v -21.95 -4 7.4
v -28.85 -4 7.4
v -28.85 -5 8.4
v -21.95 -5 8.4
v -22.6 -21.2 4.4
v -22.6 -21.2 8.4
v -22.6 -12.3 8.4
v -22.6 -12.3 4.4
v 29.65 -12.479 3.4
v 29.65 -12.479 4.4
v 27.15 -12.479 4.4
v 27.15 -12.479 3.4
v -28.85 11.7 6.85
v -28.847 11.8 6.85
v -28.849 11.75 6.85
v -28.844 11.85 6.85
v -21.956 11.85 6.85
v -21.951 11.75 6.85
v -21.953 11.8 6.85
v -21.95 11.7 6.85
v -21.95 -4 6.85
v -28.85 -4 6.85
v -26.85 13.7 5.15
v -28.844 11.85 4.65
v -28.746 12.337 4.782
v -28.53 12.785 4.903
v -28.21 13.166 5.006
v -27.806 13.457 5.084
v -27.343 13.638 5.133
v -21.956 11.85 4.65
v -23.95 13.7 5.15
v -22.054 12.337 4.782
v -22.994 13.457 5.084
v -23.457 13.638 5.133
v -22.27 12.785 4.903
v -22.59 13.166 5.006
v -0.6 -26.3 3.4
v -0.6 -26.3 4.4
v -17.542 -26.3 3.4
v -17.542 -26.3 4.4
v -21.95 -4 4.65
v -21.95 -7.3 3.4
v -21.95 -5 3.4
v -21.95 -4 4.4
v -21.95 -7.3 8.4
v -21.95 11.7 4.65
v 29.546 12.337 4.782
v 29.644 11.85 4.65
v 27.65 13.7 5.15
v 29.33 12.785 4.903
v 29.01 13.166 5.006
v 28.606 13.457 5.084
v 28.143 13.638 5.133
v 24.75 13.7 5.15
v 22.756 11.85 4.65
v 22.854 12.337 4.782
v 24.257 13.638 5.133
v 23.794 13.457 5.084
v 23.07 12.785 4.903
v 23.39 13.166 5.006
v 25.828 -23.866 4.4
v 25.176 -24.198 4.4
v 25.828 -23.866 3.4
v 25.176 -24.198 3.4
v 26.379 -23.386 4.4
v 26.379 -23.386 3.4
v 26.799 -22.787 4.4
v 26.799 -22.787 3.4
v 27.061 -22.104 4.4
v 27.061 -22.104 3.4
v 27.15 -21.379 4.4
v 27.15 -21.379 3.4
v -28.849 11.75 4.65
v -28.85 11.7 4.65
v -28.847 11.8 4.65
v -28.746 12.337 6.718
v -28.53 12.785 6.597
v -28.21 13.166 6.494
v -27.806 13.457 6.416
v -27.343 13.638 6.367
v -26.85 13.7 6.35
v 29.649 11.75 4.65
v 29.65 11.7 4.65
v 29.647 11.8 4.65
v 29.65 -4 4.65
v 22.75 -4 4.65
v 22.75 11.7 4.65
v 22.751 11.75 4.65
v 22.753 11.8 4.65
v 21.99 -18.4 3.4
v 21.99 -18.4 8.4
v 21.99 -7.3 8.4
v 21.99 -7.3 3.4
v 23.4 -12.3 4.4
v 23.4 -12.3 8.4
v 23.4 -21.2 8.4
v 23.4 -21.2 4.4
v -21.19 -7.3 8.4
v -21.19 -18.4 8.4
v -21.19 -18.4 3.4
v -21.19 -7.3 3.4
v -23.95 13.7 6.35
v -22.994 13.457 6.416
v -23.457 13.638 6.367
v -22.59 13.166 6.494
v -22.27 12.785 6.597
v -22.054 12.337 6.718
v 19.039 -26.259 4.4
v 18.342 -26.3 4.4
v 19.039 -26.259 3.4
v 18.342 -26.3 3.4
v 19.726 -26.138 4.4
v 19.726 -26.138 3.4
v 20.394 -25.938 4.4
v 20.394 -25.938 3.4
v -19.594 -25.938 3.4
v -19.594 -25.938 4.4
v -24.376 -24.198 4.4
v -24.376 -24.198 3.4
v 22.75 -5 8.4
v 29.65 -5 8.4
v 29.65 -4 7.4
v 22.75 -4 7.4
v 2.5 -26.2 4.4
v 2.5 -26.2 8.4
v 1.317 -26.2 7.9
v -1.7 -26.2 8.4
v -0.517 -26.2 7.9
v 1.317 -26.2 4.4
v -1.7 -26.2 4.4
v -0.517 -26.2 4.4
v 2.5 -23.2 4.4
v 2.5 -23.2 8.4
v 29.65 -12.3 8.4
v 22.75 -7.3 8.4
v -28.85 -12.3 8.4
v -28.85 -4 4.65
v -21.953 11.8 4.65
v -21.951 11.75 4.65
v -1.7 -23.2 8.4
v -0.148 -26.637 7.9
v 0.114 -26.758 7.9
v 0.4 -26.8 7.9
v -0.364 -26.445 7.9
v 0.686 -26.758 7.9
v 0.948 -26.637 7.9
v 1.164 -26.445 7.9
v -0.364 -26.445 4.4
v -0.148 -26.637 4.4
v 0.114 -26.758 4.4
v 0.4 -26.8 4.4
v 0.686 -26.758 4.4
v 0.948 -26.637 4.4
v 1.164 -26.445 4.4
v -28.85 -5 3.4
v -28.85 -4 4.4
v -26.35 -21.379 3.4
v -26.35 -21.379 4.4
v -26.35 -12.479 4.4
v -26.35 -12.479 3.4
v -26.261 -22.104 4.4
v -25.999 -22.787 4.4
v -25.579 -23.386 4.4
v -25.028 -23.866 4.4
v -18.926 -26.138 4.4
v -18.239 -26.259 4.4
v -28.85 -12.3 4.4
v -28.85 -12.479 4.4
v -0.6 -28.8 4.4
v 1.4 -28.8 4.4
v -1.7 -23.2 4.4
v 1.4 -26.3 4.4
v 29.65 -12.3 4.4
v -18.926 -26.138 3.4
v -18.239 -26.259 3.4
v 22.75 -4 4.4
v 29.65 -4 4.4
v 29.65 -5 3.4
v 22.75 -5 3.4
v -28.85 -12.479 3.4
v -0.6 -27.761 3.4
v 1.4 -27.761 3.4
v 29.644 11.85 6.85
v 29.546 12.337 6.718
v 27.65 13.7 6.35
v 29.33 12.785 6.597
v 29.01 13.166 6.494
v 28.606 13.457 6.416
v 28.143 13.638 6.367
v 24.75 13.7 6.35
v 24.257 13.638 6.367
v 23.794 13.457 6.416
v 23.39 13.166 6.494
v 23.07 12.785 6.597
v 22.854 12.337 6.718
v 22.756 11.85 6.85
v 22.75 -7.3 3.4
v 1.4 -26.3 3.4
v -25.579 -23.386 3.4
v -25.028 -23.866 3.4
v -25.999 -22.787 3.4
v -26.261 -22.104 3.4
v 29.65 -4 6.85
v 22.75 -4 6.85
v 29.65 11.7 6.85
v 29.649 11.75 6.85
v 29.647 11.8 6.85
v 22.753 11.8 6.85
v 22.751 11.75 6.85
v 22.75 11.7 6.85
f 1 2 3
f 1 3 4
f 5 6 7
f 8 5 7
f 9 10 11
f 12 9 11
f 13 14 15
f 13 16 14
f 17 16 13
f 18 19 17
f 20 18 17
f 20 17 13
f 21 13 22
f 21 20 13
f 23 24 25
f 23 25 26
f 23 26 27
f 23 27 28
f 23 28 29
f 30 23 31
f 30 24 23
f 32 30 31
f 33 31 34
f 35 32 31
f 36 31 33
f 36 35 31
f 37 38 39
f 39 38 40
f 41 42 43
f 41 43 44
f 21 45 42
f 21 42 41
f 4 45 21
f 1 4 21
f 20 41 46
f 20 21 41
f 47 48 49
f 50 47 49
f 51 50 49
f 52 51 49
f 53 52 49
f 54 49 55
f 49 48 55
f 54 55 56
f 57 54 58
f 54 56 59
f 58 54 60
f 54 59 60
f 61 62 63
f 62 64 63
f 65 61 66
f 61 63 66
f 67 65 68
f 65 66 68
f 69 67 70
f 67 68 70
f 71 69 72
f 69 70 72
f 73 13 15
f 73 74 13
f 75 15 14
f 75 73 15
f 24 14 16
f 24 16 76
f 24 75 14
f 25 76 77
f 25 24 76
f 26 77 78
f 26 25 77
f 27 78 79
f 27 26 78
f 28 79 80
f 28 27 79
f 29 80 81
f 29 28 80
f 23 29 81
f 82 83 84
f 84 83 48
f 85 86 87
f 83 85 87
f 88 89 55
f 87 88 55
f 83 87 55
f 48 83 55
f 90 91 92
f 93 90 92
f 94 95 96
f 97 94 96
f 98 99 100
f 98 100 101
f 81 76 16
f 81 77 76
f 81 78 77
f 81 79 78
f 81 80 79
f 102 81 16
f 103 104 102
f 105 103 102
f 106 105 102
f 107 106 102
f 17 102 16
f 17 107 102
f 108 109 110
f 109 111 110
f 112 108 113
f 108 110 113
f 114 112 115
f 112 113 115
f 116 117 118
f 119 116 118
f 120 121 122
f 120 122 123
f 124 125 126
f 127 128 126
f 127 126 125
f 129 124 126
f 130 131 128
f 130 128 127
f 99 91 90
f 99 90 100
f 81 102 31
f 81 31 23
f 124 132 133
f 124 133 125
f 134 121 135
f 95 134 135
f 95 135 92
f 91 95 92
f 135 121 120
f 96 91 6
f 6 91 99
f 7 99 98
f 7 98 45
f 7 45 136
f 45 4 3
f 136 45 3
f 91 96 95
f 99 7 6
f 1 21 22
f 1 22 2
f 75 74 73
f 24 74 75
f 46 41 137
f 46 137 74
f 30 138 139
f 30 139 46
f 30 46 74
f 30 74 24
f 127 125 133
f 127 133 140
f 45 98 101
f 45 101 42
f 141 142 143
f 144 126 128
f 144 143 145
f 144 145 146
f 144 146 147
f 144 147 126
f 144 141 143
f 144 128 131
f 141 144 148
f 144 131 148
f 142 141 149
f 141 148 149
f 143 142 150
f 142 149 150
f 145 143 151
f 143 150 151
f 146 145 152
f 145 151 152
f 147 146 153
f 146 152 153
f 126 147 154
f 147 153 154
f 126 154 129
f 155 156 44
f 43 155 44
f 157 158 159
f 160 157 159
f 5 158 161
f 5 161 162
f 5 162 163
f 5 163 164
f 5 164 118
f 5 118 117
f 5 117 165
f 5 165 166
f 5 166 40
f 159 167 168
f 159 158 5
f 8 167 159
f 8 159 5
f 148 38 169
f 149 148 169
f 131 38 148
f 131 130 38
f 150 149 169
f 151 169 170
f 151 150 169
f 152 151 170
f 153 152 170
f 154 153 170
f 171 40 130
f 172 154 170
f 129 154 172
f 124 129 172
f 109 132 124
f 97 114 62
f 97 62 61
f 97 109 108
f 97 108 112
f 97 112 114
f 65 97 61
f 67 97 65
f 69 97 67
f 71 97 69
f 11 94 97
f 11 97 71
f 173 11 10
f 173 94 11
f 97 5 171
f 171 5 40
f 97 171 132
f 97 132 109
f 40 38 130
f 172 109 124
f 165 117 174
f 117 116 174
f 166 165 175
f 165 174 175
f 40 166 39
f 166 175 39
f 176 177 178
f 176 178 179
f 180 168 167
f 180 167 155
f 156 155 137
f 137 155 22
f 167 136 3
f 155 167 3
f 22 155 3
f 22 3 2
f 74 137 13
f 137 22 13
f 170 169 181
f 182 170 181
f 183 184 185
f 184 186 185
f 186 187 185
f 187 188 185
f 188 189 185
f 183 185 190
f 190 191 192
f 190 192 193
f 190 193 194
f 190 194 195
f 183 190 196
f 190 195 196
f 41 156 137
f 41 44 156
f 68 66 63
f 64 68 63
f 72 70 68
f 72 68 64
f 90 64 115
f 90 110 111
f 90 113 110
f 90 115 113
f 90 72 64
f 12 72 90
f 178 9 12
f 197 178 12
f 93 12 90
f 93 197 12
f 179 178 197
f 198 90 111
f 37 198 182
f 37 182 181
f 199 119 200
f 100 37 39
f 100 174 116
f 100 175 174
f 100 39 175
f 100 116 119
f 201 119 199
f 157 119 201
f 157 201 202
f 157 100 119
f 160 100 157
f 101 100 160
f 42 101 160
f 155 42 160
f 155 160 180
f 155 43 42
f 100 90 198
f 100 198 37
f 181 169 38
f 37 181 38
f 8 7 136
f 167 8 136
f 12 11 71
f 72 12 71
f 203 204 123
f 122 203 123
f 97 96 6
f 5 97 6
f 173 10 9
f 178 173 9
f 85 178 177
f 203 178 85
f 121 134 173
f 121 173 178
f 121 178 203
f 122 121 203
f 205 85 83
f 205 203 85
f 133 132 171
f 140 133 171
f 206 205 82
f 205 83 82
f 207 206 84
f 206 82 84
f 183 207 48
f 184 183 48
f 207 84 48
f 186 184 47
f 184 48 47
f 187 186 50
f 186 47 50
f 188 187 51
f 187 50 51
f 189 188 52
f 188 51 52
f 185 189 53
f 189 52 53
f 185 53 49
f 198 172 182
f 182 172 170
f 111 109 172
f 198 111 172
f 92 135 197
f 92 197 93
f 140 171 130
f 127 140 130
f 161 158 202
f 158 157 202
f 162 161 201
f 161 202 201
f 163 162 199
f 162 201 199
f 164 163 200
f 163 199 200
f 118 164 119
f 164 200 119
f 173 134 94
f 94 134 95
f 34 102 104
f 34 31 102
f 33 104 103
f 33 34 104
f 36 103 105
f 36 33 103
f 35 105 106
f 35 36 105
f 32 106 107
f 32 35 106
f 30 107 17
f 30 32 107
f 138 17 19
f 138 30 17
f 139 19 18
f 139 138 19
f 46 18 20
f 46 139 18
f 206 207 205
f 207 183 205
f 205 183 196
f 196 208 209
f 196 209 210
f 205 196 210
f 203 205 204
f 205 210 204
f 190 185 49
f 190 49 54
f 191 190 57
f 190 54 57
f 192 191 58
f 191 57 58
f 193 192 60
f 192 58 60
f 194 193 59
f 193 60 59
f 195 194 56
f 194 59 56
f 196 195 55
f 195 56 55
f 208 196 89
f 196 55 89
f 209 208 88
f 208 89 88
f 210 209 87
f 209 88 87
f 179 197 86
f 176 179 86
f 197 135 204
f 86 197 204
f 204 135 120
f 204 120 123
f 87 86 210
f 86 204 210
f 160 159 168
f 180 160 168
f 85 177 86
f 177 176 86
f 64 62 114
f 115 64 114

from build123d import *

# Parameters (mm, degrees)
SKETCH_W             = 58.5
SKETCH_H             = 42.5
PAD_DEPTH            = 5
SKETCH002_W          = 43.18
SKETCH002_H          = 32.1
POCKET_DEPTH         = 5.001
SKETCH003_W          = 44.7
SKETCH003_H          = 21
POCKET001_DEPTH      = 5.001
POCKET004_DEPTH      = 4
SKETCH009_W          = 4.2
SKETCH009_H          = 3
PAD002_DEPTH         = 4
POCKET017_DEPTH      = 29.251
POCKET017_DEPTH_BACK = 29.251
SKETCH008_R          = 1
PAD016_DEPTH         = 3.5
POCKET018_DEPTH      = 5.001
FILLET_R             = 2
FILLET001_R          = 3
FILLET002_R          = 6
POCKET020_DEPTH      = 30.251
POCKET020_DEPTH_BACK = 28.251
CHAMFER_SIZE         = 1
BODY_PLACEMENT_ANGLE = 180


with BuildPart() as part:
    # Sketch → Pad (new body)
    with BuildSketch(Plane.XY):
        with Locations((0, 18.75)):
            Rectangle(SKETCH_W, SKETCH_H)
    extrude(amount=PAD_DEPTH)

    # Sketch002 → Pocket (cut, through all)
    with BuildSketch(Plane.XY):
        with Locations((0, 23.95)):
            Rectangle(SKETCH002_W, SKETCH002_H)
    extrude(amount=POCKET_DEPTH, mode=Mode.SUBTRACT)

    # Sketch003 → Pocket001 (cut, through all)
    with BuildSketch(Plane.XY):
        with Locations((0, 29.5)):
            Rectangle(SKETCH003_W, SKETCH003_H)
    extrude(amount=POCKET001_DEPTH, mode=Mode.SUBTRACT)

    # Sketch006 → Pocket004 (cut)
    with BuildSketch(Plane.XY):
        Polygon((-30, 14), (-23, 14), (-23, 5.1), (23, 5.1), (23, 14), (30, 14), (30, -2.5), (-30, -2.5), align=None)
    extrude(amount=POCKET004_DEPTH, mode=Mode.SUBTRACT)

    # Sketch009 → Pad002 (join)
    with BuildSketch(Plane(origin=(0, 0, 4), x_dir=(1, 0, 0), z_dir=(0, 0, -1))):
        with Locations((0, -1.6)):
            Rectangle(SKETCH009_W, SKETCH009_H)
    extrude(amount=PAD002_DEPTH)

    # Sketch005 → Pocket017 (cut, two sides)
    with BuildSketch(Plane.YZ) as pocket017_sk:
        Polygon((22.3, 7.55), (22.3, 3.75), (38.15, 3.75), (40, 3.250139), (40, 2.050139), (38.15, 1.55), (22.3, 1.55), (22.3, -2.25), (45.66, -2.25), (45.66, 7.55), align=None)
    extrude(amount=-POCKET017_DEPTH, mode=Mode.SUBTRACT)
    extrude(pocket017_sk.sketch, amount=POCKET017_DEPTH_BACK, mode=Mode.SUBTRACT)

    # Sketch008 (on Face13 of Pocket017) → Pad016 (join)
    with BuildSketch(Plane(origin=(0, 0, 4), x_dir=(1, 0, 0), z_dir=(0, 0, -1))):
        with Locations((0, -0.5)):
            Circle(SKETCH008_R)
    extrude(amount=PAD016_DEPTH)

    # Sketch034 → Pocket018 (cut, through all)
    with BuildSketch(Plane.XY):
        Polygon((-19, 0), (-1, 0), (-1, -3), (1, -3), (1, 0), (19, 0), (26.75, 2.820769), (26.75, 13.820769), (30, 13.820769), (30, -4), (-30, -4), (-30, 13.820769), (-26.75, 13.820769), (-26.75, 2.820769), align=None)
    extrude(amount=POCKET018_DEPTH, mode=Mode.SUBTRACT)

    # Fillet
    fillet_edges = [part.edges().sort_by_distance(p)[0] for p in [
        (29.25, 40, 2.650139),
        (22.35, 40, 2.650139),
        (-22.35, 40, 2.650139),
        (-29.25, 40, 2.650139),
    ]]
    fillet(fillet_edges, radius=FILLET_R)

    # Fillet001
    fillet001_edges = [part.edges().sort_by_distance(p)[0] for p in [
        (26.75, 2.820769, 4.5),
        (-26.75, 2.820769, 4.5),
    ]]
    fillet(fillet001_edges, radius=FILLET001_R)

    # Fillet002
    fillet002_edges = [part.edges().sort_by_distance(p)[0] for p in [
        (-19, 0, 4.5),
        (19, 0, 4.5),
    ]]
    fillet(fillet002_edges, radius=FILLET002_R)

    # Sketch038 (on Face7 of Fillet002) → Pocket020 (cut, two sides)
    with BuildSketch(Plane.YZ.offset(1)) as pocket020_sk:
        Polygon((-2.5, 4), (-1.461179, 5), (-1.461179, 5.705107), (-3.685712, 5.705107), (-3.685712, 4.047004), align=None)
    extrude(amount=-POCKET020_DEPTH, mode=Mode.SUBTRACT)
    extrude(pocket020_sk.sketch, amount=POCKET020_DEPTH_BACK, mode=Mode.SUBTRACT)

    # Chamfer
    chamfer_edges = [part.edges().sort_by_distance(p)[0] for p in [
        (-25.8, 22.3, 0),
        (-25.8, 22.3, 5),
        (25.8, 22.3, 5),
        (25.8, 22.3, 0),
    ]]
    chamfer(chamfer_edges, length=CHAMFER_SIZE)


with BuildPart() as part_1:
    # Body placement: moved
    add(part.part.moved(Location((0.4, -26.3, 8.4))).rotate(Axis((0.4, -26.3, 8.4), (0, 1, 0)), BODY_PLACEMENT_ANGLE))


solid = part_1.part
